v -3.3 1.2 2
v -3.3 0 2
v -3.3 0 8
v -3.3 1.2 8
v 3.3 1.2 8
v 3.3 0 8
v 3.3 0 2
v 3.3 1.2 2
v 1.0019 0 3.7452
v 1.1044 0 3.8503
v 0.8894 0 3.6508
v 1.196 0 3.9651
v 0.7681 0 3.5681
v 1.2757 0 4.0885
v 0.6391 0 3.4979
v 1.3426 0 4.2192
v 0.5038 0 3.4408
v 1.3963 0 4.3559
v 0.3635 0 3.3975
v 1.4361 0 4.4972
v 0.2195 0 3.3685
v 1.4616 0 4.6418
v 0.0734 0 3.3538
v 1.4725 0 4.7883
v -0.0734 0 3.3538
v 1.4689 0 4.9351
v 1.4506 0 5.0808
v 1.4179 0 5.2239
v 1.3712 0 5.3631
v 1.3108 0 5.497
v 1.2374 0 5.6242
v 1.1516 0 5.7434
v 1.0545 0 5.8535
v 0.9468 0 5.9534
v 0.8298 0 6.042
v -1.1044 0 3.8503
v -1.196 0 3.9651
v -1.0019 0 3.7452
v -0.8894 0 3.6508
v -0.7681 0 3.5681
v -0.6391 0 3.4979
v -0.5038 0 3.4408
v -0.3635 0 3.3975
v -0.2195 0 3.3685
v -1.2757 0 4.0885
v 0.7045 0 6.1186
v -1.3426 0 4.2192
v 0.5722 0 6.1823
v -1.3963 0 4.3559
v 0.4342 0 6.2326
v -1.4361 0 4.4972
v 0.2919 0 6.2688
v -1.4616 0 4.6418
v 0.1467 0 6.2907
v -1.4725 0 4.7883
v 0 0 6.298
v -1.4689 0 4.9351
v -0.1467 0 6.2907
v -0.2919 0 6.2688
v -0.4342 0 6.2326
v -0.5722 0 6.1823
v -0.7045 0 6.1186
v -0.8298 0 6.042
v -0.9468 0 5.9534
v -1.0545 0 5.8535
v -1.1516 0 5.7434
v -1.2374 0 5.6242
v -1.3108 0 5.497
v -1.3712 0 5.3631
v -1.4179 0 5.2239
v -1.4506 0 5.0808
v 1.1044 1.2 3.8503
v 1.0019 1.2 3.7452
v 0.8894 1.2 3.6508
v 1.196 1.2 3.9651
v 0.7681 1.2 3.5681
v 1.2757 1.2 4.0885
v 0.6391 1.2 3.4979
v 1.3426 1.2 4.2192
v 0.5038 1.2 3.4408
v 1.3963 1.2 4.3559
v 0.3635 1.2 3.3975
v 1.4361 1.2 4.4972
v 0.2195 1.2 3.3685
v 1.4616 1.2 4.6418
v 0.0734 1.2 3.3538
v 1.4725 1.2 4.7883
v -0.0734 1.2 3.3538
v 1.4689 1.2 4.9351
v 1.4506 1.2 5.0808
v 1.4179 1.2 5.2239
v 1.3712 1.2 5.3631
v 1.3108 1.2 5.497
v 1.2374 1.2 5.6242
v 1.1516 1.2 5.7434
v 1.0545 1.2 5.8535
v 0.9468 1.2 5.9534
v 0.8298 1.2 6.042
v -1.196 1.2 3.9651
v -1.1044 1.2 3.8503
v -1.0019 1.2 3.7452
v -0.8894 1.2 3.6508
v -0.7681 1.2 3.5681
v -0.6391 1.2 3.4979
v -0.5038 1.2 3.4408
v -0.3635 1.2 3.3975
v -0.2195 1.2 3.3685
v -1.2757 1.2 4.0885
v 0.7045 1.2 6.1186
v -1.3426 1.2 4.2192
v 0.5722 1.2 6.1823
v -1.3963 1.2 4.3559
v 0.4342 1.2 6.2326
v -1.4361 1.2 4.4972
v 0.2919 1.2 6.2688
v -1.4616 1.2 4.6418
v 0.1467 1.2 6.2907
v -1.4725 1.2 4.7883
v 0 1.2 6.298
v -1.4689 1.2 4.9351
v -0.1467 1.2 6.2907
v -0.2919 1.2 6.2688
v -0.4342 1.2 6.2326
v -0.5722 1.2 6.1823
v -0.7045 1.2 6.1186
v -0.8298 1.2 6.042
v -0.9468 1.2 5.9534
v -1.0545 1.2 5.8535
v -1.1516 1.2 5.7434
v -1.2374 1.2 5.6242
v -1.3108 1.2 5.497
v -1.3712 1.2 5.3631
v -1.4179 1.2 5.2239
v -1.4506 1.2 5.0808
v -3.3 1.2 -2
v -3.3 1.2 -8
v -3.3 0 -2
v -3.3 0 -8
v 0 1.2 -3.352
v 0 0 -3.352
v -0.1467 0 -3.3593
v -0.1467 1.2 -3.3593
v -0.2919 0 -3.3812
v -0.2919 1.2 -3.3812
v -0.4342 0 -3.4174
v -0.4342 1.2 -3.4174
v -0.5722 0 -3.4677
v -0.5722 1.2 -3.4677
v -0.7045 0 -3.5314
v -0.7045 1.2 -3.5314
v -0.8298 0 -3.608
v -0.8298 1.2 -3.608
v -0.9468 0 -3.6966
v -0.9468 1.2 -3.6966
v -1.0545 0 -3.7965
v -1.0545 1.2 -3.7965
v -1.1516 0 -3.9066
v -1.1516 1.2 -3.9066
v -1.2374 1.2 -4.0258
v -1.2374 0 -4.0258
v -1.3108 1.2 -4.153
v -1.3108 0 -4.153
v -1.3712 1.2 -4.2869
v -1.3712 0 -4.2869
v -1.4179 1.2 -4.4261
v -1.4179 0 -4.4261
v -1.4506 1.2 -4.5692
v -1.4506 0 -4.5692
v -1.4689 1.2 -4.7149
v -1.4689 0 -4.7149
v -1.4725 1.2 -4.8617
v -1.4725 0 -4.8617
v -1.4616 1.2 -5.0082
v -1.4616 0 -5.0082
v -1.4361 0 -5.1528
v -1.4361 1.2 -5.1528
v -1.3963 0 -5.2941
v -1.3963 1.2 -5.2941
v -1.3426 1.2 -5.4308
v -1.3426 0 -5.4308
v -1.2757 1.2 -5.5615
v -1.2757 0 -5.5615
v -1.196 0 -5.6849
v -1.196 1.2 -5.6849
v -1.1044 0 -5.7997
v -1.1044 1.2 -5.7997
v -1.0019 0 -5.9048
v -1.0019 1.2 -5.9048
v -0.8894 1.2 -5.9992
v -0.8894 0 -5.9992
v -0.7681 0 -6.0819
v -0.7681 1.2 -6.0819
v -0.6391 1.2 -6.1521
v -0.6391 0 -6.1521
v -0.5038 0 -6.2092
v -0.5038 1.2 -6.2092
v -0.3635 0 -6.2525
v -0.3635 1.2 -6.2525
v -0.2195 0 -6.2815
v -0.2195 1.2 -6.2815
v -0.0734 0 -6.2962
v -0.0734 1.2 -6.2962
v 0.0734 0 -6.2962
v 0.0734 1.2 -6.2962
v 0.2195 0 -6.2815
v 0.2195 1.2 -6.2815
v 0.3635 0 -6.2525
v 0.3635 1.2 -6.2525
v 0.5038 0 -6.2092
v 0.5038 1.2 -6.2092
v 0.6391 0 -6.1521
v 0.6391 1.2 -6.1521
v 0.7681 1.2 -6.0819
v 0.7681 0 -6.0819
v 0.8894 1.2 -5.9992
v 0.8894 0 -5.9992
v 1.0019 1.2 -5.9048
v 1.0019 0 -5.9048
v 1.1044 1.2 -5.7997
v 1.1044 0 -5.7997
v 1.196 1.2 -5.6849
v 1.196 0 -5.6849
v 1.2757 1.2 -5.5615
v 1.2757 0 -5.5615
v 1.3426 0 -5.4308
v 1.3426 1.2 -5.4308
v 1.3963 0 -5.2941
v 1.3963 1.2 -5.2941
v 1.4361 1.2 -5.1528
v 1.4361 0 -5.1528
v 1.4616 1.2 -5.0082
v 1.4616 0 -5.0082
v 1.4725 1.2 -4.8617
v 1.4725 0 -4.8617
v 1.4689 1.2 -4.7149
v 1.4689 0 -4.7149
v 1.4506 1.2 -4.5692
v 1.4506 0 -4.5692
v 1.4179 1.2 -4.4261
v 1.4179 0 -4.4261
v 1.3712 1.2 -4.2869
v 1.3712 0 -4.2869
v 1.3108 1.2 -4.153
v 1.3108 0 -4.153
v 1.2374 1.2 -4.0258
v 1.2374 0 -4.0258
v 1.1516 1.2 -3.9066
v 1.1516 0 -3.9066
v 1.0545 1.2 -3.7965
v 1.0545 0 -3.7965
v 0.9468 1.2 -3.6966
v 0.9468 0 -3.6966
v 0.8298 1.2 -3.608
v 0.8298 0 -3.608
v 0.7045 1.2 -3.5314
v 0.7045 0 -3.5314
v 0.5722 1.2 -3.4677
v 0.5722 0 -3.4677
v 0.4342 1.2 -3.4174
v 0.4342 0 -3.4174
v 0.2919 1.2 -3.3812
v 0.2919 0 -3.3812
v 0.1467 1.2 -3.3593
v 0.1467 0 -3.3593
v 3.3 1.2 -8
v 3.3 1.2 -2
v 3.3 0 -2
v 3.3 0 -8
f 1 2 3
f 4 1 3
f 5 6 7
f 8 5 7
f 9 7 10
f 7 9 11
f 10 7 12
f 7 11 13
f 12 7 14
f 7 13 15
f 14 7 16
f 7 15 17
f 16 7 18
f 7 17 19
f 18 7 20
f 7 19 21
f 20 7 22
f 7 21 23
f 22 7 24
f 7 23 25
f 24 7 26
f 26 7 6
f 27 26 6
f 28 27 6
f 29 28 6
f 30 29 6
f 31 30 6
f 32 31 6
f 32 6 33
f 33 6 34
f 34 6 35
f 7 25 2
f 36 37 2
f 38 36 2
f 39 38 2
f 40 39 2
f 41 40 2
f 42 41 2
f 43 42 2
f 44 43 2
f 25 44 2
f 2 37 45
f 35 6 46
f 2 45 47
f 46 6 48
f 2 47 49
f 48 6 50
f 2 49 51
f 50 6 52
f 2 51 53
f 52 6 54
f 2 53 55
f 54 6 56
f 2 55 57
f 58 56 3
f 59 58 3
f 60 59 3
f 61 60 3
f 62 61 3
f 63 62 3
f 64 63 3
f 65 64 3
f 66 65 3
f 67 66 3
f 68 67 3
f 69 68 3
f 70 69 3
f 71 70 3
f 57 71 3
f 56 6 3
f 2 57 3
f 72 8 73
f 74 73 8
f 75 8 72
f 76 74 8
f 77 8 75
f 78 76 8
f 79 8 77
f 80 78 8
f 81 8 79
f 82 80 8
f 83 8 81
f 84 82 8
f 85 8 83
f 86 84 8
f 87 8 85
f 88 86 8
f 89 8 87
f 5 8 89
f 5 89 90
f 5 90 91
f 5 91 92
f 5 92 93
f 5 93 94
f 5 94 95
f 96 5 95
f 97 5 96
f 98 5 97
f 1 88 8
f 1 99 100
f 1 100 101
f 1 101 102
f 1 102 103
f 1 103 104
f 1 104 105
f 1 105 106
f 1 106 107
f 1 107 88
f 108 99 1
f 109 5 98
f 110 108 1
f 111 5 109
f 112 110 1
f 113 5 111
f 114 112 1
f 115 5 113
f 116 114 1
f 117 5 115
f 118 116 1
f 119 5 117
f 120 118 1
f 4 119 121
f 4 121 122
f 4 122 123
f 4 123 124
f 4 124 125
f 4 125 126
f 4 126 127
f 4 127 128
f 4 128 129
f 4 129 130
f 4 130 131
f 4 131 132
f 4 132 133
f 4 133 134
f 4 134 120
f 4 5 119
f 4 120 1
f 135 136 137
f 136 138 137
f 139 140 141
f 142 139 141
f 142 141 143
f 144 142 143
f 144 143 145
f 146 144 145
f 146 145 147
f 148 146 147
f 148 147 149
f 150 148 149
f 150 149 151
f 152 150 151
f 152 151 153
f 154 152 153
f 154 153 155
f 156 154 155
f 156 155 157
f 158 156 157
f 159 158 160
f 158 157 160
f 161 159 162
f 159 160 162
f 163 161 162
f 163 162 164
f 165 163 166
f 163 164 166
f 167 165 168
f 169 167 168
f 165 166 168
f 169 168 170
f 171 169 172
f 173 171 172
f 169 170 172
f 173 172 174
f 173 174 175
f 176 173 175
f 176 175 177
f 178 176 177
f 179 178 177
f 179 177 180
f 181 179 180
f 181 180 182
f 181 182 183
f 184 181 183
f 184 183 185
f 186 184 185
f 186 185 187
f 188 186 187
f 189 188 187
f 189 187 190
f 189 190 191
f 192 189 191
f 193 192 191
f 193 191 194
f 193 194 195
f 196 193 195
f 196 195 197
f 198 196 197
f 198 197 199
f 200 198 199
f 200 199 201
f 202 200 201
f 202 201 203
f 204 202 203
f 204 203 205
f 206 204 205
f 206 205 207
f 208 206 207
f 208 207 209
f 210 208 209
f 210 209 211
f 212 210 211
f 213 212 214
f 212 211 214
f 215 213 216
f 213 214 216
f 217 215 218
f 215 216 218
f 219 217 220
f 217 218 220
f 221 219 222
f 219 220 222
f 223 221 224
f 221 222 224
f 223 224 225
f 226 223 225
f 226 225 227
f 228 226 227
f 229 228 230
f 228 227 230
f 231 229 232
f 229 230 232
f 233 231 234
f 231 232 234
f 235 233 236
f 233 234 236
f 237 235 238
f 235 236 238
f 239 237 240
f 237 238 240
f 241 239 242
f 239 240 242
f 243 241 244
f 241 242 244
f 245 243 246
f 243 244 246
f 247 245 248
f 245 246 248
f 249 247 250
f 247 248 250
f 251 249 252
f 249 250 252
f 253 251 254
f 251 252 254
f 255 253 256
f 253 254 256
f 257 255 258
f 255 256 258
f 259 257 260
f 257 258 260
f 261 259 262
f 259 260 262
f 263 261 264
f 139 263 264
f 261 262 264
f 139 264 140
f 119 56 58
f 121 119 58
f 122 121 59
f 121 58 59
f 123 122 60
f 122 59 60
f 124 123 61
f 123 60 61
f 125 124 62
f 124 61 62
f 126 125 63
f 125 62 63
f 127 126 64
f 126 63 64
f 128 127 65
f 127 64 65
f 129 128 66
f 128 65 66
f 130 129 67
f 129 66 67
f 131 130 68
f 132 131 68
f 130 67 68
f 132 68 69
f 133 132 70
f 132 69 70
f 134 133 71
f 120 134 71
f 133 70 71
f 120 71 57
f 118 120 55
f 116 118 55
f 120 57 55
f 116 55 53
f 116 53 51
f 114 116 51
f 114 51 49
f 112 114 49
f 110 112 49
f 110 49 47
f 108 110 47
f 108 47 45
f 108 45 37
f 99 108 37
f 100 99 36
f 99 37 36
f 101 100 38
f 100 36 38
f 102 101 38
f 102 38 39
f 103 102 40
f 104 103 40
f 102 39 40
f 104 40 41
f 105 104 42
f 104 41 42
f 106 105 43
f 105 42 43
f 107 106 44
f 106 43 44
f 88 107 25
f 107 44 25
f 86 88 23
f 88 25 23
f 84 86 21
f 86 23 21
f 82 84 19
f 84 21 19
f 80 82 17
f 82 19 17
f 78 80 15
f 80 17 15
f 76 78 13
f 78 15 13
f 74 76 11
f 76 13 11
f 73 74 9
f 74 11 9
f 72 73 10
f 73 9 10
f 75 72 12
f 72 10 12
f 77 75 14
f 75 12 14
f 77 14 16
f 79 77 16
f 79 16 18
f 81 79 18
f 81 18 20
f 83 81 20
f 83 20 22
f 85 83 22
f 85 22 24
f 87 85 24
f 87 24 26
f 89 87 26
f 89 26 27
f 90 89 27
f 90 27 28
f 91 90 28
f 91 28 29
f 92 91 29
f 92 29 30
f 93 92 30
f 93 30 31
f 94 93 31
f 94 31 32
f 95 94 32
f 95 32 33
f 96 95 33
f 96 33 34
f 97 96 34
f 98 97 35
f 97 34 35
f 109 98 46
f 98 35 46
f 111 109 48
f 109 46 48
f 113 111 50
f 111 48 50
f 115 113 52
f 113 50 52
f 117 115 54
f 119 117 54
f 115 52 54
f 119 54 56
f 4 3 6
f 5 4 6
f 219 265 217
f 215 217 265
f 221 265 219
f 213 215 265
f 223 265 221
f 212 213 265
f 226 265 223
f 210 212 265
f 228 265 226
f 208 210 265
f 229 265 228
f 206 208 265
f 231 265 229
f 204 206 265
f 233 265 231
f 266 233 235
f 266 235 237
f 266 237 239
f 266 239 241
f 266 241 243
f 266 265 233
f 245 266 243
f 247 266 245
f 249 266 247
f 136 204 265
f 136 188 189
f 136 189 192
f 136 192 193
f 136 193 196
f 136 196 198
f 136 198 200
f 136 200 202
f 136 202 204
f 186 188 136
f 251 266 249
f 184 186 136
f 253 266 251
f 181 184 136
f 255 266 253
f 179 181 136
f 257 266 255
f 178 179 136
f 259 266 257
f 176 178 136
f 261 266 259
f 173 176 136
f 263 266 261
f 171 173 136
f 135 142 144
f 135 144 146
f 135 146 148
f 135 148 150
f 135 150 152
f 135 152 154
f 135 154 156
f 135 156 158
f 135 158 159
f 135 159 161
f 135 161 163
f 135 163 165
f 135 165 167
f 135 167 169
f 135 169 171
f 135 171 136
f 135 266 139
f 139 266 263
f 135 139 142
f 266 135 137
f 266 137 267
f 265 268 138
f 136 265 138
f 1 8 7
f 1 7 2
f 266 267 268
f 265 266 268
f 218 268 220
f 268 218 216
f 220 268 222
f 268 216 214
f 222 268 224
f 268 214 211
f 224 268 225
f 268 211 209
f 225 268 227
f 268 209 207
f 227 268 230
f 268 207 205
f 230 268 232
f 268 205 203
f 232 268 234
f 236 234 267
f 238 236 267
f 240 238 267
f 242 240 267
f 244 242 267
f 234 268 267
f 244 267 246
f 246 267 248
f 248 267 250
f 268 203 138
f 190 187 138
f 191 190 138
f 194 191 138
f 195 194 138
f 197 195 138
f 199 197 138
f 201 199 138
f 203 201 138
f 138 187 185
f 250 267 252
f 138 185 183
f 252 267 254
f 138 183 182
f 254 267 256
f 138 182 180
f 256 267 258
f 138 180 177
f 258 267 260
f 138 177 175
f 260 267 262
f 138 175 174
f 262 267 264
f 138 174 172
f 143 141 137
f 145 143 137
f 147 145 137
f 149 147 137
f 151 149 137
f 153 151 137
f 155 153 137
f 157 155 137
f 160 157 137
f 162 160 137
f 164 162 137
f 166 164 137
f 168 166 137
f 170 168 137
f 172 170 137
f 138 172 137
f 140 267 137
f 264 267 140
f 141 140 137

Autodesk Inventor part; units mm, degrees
ref_plane "YZ Plane" through (0, 0, 0) normal (1, 0, 0) x (0, 1, 0)
ref_plane "XZ Plane" through (0, 0, 0) normal (0, 1, 0) x (-1, 0, 0)
ref_plane "XY Plane" through (0, 0, 0) normal (0, 0, 1) x (1, 0, 0)
sketch "Sketch2" plane through (0, 0, 0) normal (0, 1, 0) x (-1, 0, 0)
  line L0 (3.3, 8) -> (-3.3, 8)
  line L1 (-3.3, 8) -> (-3.3, -8)
  line L2 (-3.3, -8) -> (3.3, -8)
  line L3 (3.3, -8) -> (3.3, 8)
  line L4 (3.3, 8) -> (-3.3, -8) construction
  line L5 (-3.3, 8) -> (3.3, -8) construction
  point P0 (0, 0)
  dimension "d0" = 6.6
  dimension "d1" = 16
extrude "Extrusion1" add sketch "Sketch2" along normal blind 1.2
sketch "Sketch3" plane through (0, 1.2, 0) normal (0, 1, 0) x (1, 0, 0)
  line L0 (-3.3, -8) -> (3.3, -8) projected
  line L1 (3.3, 8) -> (-3.3, 8) projected
  point P0 (0, 0)
  point P1 (0, 4.825)
  point P2 (0, -4.825)
hole "Hole1" at (0, 1.2, -4.825) at (0, 1.2, 4.825) direction (0, -1, 0) diameter 2.946 end through all clearance for "Flat Head Machine Screw (82)" size "#4" standard "Ansi Unified Screw Threads"
sketch "Sketch4" plane through (0, 1.2, 0) normal (0, 1, 0) x (1, 0, 0)
  line L0 (-3.3, 2) -> (3.3, 2)
  line L1 (3.3, 2) -> (3.3, -2)
  line L2 (3.3, -2) -> (-3.3, -2)
  line L3 (-3.3, -2) -> (-3.3, 2)
  line L4 (-3.3, 2) -> (3.3, -2) construction
  line L5 (3.3, 2) -> (-3.3, -2) construction
  point P0 (0, 0)
  dimension "d13" = 6.6
  dimension "d14" = 4
extrude "Extrusion2" cut sketch "Sketch4" against normal up to next
properties part number "shapal_ledgereod"
